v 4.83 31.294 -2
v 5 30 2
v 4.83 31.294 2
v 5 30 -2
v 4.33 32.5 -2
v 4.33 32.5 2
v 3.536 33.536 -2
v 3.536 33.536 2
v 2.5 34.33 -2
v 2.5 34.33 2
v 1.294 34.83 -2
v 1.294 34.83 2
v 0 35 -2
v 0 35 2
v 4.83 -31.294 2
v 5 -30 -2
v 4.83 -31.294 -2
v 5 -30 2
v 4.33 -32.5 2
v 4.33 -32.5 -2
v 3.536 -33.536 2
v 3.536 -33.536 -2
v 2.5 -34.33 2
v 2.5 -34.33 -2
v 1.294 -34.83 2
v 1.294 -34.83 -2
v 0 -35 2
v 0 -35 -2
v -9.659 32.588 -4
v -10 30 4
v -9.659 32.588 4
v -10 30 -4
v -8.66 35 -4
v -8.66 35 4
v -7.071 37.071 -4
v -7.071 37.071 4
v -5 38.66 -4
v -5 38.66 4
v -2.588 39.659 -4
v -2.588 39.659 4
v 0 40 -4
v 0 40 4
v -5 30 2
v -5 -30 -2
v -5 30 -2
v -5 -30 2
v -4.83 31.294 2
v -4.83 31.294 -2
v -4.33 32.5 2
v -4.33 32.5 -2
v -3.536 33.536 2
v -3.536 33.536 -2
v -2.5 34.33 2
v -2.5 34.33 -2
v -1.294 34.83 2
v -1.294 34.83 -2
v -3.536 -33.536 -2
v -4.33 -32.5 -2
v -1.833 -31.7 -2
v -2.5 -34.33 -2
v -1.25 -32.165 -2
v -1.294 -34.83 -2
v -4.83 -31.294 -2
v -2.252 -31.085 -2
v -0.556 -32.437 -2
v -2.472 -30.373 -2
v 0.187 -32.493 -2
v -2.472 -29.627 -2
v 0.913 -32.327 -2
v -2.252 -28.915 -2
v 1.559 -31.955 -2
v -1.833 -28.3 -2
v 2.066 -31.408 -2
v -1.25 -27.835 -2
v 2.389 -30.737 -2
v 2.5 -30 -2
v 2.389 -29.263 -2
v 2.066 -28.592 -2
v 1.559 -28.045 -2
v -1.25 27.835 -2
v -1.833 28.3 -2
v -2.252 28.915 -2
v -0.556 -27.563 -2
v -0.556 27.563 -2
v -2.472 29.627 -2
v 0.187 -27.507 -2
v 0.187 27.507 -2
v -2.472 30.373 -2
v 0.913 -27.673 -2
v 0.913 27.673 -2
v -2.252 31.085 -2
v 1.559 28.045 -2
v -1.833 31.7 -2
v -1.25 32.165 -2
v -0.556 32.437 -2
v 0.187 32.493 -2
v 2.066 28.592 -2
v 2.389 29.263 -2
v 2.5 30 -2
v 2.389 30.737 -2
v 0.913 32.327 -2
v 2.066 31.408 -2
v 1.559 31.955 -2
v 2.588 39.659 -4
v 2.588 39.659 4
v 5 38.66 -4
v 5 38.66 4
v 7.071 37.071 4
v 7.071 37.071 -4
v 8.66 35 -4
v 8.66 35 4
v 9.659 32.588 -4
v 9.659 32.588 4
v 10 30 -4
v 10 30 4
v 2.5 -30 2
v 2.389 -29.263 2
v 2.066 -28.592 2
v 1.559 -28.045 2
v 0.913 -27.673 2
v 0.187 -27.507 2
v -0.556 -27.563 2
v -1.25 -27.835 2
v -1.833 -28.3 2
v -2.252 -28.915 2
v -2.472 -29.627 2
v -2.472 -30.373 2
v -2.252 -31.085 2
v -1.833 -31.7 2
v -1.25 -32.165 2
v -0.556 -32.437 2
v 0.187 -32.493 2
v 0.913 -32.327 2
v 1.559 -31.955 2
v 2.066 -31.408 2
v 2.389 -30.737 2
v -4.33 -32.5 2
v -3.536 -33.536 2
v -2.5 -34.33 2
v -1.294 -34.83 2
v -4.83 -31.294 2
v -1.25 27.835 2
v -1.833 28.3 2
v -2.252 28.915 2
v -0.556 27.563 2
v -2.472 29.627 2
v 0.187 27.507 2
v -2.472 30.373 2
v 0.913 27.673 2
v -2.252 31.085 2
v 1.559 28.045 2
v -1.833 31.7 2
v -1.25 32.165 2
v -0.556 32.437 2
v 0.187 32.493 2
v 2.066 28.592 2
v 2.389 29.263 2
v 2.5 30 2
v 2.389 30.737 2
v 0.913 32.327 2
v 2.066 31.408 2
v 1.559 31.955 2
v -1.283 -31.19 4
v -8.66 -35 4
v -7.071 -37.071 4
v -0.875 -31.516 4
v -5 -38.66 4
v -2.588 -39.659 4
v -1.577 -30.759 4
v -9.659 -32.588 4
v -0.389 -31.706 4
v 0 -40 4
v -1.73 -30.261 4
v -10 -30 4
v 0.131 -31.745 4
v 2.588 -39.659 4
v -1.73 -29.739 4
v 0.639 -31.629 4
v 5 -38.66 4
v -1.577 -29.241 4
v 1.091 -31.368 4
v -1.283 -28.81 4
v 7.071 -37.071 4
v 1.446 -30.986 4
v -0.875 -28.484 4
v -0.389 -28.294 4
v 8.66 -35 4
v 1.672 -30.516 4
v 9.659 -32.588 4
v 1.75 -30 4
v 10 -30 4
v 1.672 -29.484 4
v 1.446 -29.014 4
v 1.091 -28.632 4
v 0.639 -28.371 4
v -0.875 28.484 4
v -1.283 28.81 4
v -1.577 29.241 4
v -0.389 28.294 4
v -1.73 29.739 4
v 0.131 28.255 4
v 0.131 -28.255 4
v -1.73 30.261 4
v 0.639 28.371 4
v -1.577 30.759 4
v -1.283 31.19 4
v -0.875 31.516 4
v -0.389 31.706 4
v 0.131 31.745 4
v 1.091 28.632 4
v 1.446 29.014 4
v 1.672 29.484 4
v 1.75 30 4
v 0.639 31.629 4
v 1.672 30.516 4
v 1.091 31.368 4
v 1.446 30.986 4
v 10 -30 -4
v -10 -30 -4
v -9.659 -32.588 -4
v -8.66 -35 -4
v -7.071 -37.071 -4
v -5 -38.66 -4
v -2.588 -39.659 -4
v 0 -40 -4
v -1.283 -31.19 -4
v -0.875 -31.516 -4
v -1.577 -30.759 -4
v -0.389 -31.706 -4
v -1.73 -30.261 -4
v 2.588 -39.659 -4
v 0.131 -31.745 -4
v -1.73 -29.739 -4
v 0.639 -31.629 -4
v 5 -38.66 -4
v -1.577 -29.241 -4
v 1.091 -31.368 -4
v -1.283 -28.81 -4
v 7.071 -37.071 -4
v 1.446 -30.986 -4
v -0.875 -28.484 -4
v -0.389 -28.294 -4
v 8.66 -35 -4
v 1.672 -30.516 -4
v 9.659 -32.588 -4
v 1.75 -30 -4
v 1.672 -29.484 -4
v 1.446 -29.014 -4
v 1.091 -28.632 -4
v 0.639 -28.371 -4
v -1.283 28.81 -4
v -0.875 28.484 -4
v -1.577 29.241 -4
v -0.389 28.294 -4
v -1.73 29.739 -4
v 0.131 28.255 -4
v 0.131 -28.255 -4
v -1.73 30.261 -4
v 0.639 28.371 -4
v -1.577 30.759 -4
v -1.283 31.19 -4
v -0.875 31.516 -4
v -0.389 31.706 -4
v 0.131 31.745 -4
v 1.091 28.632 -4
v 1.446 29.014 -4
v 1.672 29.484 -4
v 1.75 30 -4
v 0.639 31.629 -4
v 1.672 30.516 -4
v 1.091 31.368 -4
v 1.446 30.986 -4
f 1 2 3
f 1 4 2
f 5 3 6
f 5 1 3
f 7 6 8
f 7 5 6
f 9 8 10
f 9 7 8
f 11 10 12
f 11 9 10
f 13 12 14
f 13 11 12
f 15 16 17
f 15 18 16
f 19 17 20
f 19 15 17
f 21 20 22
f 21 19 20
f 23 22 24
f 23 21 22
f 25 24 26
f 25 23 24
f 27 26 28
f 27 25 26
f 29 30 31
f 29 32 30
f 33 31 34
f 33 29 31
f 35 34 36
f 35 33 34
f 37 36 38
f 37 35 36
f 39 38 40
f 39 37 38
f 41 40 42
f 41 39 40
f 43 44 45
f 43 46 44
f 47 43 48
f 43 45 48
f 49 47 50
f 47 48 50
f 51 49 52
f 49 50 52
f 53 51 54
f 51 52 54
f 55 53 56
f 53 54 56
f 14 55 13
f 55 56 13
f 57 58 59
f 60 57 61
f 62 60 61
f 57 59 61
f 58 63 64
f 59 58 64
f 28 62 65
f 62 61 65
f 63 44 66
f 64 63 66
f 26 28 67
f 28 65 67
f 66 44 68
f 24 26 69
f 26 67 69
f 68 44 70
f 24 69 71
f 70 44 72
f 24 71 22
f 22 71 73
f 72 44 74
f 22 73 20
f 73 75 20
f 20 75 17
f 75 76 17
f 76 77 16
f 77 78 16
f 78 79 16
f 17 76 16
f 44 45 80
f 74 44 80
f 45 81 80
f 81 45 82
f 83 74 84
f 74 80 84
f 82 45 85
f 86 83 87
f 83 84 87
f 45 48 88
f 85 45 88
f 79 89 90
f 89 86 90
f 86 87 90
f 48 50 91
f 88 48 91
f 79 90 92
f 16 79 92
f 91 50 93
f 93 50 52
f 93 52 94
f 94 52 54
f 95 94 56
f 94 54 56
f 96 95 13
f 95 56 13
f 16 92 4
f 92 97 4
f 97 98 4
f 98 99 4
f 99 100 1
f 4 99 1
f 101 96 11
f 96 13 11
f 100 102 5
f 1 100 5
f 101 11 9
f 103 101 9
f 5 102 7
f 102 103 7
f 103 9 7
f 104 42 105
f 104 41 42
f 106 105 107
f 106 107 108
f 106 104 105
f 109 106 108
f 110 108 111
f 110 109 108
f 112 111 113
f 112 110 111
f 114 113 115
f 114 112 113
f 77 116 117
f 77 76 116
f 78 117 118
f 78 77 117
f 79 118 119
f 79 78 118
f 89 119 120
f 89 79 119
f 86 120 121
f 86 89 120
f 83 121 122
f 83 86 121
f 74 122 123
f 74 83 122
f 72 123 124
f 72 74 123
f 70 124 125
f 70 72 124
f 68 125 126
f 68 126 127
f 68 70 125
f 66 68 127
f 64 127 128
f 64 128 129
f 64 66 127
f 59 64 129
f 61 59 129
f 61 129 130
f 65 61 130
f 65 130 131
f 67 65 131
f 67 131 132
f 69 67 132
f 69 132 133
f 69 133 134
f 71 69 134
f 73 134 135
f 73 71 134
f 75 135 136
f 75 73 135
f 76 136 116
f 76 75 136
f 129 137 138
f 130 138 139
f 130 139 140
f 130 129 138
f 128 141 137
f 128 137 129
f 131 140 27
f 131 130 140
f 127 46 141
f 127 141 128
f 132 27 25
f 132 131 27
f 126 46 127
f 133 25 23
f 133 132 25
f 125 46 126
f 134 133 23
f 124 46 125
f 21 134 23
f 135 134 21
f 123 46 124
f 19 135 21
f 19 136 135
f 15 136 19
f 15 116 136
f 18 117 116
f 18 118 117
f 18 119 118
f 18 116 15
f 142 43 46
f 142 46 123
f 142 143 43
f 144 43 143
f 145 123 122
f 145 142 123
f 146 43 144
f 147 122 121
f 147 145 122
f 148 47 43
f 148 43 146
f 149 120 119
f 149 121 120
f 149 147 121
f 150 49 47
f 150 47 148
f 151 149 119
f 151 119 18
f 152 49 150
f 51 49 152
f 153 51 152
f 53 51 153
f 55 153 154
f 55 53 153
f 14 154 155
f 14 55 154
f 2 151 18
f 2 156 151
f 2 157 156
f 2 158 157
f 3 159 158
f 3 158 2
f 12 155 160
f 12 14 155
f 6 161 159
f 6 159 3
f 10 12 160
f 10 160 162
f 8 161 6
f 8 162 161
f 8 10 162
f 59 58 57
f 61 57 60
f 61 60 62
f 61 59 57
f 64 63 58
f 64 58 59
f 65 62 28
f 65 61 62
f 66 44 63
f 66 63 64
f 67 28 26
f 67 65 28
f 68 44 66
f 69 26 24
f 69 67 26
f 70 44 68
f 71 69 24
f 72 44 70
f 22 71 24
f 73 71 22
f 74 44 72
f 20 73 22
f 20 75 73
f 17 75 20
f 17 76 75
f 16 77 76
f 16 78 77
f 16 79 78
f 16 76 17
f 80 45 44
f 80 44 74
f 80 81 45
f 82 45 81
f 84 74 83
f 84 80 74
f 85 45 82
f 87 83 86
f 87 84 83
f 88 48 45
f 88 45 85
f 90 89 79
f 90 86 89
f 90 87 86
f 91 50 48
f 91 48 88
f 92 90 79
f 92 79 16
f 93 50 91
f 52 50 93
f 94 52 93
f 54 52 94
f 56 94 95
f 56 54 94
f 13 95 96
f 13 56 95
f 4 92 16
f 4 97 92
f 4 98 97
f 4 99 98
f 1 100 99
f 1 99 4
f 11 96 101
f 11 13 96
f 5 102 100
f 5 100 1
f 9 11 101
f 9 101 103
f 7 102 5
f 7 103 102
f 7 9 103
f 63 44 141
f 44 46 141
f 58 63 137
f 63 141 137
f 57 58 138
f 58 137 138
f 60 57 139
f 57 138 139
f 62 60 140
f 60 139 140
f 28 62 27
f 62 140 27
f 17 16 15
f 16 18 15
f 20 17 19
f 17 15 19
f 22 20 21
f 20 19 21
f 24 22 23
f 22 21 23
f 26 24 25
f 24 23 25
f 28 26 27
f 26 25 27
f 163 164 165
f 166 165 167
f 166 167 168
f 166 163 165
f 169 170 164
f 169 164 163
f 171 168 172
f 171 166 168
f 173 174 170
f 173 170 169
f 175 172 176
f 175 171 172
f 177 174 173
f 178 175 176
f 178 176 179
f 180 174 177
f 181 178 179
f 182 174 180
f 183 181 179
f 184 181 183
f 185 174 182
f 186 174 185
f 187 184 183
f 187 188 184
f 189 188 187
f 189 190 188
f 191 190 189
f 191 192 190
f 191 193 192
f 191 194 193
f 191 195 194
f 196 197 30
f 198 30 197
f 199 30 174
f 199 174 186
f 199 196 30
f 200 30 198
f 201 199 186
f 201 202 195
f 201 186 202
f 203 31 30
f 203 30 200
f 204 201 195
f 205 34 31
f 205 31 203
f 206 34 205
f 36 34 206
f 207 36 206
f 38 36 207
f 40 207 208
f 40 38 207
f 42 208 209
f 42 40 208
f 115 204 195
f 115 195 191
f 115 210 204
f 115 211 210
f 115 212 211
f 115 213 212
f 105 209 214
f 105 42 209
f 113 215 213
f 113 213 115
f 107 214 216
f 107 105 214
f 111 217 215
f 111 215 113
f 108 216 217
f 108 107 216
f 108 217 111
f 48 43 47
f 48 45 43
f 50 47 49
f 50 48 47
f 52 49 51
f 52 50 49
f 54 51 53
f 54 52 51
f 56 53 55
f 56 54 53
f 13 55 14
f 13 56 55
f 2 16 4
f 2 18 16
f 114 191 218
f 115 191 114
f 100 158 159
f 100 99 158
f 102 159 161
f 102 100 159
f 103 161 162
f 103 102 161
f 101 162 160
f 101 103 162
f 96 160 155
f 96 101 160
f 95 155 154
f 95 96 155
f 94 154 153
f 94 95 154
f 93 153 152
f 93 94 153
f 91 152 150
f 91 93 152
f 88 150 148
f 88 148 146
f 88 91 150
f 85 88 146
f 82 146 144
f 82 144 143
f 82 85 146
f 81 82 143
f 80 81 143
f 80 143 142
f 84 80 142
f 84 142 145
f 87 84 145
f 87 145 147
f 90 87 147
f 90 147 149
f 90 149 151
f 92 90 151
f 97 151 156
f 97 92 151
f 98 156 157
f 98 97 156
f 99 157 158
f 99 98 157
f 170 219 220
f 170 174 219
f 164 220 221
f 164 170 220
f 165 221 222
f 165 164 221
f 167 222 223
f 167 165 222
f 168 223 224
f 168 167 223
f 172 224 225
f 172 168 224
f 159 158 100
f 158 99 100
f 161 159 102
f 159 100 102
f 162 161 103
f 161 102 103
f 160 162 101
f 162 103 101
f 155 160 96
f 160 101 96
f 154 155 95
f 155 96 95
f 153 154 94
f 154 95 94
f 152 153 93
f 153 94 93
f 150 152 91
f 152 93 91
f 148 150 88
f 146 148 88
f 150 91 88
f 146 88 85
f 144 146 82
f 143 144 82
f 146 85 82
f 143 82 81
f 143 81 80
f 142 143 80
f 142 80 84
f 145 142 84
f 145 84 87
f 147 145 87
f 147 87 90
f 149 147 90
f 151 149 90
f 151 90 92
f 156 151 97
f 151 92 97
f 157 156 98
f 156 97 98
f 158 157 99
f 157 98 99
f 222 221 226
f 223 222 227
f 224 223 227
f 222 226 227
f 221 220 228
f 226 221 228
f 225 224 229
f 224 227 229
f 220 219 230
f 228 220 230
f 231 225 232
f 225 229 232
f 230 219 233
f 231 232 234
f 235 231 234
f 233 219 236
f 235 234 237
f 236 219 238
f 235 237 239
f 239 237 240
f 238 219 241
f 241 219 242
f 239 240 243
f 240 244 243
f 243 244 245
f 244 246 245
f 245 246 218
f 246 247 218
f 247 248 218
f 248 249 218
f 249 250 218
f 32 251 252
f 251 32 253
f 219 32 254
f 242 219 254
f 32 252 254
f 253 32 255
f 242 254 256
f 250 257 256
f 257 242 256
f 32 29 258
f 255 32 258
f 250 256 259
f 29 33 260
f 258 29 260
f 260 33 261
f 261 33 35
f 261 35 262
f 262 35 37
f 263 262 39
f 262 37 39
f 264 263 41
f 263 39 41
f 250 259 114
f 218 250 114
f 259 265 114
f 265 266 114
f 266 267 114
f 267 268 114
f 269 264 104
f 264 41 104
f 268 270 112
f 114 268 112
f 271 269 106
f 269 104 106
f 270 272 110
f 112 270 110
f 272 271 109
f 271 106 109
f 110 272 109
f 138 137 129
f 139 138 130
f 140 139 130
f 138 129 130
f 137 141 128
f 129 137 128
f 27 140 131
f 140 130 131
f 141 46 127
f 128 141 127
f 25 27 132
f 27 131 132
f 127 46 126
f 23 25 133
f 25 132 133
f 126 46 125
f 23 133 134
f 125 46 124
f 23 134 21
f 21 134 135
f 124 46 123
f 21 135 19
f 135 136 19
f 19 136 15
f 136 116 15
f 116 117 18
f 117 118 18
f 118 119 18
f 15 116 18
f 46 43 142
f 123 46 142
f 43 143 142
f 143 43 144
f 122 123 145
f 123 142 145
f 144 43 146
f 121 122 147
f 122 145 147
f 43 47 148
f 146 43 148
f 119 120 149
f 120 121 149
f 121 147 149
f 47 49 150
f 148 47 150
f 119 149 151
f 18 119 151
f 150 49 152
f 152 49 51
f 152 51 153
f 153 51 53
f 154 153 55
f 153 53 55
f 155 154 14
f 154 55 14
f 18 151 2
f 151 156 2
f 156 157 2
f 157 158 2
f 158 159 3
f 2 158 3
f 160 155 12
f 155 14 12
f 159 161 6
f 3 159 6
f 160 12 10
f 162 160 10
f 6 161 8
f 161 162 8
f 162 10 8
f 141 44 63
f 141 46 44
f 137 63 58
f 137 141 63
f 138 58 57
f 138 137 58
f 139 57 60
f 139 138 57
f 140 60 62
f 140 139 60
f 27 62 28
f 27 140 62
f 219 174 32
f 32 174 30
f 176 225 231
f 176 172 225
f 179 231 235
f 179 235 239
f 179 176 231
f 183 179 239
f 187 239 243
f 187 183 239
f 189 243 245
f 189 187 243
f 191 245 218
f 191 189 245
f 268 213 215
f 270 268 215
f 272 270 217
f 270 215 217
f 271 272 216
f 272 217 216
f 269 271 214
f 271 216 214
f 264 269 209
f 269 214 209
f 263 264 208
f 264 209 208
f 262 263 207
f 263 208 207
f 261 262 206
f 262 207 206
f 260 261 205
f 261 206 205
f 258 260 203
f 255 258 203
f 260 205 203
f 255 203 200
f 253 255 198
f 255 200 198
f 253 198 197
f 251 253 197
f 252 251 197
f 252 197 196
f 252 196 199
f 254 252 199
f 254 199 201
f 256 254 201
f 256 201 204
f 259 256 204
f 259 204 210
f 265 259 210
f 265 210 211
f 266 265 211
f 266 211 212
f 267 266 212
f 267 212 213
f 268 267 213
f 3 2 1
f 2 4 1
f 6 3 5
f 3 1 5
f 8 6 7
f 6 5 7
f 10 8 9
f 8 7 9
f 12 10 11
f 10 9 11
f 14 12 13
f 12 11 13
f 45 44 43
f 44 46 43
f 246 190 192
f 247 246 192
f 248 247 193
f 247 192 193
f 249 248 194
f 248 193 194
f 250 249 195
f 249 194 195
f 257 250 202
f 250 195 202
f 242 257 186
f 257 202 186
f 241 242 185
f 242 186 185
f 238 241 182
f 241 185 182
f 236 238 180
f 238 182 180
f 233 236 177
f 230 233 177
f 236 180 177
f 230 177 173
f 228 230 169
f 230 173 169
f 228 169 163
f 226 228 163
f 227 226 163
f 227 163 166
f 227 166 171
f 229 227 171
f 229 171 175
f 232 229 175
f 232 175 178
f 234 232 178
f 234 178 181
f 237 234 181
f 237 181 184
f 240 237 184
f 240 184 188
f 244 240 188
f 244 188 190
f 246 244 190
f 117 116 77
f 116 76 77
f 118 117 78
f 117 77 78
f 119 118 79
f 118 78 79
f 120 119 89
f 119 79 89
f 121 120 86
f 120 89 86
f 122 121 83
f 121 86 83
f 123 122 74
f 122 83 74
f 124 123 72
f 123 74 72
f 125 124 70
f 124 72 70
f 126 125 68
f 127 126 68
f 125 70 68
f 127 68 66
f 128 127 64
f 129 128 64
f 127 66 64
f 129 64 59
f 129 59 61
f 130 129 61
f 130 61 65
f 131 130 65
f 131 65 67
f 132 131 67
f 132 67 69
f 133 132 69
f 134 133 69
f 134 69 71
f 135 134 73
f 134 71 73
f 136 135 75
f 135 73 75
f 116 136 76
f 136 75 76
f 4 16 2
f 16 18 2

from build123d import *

# Parameters (mm, degrees)
F0_W     = 20
F0_H     = 80
F1_DEPTH = 4
F2_W     = 10
F2_H     = 70
F2_R     = 2.5
F3_DEPTH = 2
F4_R     = 1.75
F5_DEPTH = 8.001
F6_R     = 4.99999
F7_R     = 9.99999


# Not quite as in the source:
# - a fillet or chamfer is up to 0.001 mm smaller than in the source, because OpenCascade refuses the exact size


with BuildPart() as f1:
    # F0 (on Top) → F1 (new body, symmetric)
    with BuildSketch(Plane.XY):
        Rectangle(F0_W, F0_H)
    extrude(amount=F1_DEPTH, both=True)

    # F4 (on face) → F5 (cut, through all)
    with BuildSketch(Plane.XY.offset(4)):
        with Locations((0, 30)):
            Circle(F4_R)
        with Locations((0, -30)):
            Circle(F4_R)
    extrude(amount=-F5_DEPTH, mode=Mode.SUBTRACT)

    # F7 (radius 10 in the source; OpenCascade refuses exactly that, so slightly less here)
    f7_edges = [f1.edges().sort_by_distance(p)[0] for p in [
        (10, 40, 0),
        (-10, 40, 0),
        (-10, -40, 0),
        (10, -40, 0),
    ]]
    fillet(f7_edges, radius=F7_R)


with BuildPart() as f3:
    # F2 (on Top) → F3 (new body, symmetric)
    with BuildSketch(Plane.XY):
        Rectangle(F2_W, F2_H)
        with Locations((0, -30)):
            Circle(F2_R, mode=Mode.SUBTRACT)
        with Locations((0, 30)):
            Circle(F2_R, mode=Mode.SUBTRACT)
    extrude(amount=F3_DEPTH, both=True)

    # F6 (radius 5 in the source; OpenCascade refuses exactly that, so slightly less here)
    f6_edges = [f3.edges().sort_by_distance(p)[0] for p in [
        (5, -35, 0),
        (-5, -35, 0),
        (5, 35, 0),
        (-5, 35, 0),
    ]]
    fillet(f6_edges, radius=F6_R)


with BuildPart() as f1_1:
    add(f1.part)

    # F8: cut F3
    add(f3.part, mode=Mode.SUBTRACT)


solid = Compound([f3.part, f1_1.part])
